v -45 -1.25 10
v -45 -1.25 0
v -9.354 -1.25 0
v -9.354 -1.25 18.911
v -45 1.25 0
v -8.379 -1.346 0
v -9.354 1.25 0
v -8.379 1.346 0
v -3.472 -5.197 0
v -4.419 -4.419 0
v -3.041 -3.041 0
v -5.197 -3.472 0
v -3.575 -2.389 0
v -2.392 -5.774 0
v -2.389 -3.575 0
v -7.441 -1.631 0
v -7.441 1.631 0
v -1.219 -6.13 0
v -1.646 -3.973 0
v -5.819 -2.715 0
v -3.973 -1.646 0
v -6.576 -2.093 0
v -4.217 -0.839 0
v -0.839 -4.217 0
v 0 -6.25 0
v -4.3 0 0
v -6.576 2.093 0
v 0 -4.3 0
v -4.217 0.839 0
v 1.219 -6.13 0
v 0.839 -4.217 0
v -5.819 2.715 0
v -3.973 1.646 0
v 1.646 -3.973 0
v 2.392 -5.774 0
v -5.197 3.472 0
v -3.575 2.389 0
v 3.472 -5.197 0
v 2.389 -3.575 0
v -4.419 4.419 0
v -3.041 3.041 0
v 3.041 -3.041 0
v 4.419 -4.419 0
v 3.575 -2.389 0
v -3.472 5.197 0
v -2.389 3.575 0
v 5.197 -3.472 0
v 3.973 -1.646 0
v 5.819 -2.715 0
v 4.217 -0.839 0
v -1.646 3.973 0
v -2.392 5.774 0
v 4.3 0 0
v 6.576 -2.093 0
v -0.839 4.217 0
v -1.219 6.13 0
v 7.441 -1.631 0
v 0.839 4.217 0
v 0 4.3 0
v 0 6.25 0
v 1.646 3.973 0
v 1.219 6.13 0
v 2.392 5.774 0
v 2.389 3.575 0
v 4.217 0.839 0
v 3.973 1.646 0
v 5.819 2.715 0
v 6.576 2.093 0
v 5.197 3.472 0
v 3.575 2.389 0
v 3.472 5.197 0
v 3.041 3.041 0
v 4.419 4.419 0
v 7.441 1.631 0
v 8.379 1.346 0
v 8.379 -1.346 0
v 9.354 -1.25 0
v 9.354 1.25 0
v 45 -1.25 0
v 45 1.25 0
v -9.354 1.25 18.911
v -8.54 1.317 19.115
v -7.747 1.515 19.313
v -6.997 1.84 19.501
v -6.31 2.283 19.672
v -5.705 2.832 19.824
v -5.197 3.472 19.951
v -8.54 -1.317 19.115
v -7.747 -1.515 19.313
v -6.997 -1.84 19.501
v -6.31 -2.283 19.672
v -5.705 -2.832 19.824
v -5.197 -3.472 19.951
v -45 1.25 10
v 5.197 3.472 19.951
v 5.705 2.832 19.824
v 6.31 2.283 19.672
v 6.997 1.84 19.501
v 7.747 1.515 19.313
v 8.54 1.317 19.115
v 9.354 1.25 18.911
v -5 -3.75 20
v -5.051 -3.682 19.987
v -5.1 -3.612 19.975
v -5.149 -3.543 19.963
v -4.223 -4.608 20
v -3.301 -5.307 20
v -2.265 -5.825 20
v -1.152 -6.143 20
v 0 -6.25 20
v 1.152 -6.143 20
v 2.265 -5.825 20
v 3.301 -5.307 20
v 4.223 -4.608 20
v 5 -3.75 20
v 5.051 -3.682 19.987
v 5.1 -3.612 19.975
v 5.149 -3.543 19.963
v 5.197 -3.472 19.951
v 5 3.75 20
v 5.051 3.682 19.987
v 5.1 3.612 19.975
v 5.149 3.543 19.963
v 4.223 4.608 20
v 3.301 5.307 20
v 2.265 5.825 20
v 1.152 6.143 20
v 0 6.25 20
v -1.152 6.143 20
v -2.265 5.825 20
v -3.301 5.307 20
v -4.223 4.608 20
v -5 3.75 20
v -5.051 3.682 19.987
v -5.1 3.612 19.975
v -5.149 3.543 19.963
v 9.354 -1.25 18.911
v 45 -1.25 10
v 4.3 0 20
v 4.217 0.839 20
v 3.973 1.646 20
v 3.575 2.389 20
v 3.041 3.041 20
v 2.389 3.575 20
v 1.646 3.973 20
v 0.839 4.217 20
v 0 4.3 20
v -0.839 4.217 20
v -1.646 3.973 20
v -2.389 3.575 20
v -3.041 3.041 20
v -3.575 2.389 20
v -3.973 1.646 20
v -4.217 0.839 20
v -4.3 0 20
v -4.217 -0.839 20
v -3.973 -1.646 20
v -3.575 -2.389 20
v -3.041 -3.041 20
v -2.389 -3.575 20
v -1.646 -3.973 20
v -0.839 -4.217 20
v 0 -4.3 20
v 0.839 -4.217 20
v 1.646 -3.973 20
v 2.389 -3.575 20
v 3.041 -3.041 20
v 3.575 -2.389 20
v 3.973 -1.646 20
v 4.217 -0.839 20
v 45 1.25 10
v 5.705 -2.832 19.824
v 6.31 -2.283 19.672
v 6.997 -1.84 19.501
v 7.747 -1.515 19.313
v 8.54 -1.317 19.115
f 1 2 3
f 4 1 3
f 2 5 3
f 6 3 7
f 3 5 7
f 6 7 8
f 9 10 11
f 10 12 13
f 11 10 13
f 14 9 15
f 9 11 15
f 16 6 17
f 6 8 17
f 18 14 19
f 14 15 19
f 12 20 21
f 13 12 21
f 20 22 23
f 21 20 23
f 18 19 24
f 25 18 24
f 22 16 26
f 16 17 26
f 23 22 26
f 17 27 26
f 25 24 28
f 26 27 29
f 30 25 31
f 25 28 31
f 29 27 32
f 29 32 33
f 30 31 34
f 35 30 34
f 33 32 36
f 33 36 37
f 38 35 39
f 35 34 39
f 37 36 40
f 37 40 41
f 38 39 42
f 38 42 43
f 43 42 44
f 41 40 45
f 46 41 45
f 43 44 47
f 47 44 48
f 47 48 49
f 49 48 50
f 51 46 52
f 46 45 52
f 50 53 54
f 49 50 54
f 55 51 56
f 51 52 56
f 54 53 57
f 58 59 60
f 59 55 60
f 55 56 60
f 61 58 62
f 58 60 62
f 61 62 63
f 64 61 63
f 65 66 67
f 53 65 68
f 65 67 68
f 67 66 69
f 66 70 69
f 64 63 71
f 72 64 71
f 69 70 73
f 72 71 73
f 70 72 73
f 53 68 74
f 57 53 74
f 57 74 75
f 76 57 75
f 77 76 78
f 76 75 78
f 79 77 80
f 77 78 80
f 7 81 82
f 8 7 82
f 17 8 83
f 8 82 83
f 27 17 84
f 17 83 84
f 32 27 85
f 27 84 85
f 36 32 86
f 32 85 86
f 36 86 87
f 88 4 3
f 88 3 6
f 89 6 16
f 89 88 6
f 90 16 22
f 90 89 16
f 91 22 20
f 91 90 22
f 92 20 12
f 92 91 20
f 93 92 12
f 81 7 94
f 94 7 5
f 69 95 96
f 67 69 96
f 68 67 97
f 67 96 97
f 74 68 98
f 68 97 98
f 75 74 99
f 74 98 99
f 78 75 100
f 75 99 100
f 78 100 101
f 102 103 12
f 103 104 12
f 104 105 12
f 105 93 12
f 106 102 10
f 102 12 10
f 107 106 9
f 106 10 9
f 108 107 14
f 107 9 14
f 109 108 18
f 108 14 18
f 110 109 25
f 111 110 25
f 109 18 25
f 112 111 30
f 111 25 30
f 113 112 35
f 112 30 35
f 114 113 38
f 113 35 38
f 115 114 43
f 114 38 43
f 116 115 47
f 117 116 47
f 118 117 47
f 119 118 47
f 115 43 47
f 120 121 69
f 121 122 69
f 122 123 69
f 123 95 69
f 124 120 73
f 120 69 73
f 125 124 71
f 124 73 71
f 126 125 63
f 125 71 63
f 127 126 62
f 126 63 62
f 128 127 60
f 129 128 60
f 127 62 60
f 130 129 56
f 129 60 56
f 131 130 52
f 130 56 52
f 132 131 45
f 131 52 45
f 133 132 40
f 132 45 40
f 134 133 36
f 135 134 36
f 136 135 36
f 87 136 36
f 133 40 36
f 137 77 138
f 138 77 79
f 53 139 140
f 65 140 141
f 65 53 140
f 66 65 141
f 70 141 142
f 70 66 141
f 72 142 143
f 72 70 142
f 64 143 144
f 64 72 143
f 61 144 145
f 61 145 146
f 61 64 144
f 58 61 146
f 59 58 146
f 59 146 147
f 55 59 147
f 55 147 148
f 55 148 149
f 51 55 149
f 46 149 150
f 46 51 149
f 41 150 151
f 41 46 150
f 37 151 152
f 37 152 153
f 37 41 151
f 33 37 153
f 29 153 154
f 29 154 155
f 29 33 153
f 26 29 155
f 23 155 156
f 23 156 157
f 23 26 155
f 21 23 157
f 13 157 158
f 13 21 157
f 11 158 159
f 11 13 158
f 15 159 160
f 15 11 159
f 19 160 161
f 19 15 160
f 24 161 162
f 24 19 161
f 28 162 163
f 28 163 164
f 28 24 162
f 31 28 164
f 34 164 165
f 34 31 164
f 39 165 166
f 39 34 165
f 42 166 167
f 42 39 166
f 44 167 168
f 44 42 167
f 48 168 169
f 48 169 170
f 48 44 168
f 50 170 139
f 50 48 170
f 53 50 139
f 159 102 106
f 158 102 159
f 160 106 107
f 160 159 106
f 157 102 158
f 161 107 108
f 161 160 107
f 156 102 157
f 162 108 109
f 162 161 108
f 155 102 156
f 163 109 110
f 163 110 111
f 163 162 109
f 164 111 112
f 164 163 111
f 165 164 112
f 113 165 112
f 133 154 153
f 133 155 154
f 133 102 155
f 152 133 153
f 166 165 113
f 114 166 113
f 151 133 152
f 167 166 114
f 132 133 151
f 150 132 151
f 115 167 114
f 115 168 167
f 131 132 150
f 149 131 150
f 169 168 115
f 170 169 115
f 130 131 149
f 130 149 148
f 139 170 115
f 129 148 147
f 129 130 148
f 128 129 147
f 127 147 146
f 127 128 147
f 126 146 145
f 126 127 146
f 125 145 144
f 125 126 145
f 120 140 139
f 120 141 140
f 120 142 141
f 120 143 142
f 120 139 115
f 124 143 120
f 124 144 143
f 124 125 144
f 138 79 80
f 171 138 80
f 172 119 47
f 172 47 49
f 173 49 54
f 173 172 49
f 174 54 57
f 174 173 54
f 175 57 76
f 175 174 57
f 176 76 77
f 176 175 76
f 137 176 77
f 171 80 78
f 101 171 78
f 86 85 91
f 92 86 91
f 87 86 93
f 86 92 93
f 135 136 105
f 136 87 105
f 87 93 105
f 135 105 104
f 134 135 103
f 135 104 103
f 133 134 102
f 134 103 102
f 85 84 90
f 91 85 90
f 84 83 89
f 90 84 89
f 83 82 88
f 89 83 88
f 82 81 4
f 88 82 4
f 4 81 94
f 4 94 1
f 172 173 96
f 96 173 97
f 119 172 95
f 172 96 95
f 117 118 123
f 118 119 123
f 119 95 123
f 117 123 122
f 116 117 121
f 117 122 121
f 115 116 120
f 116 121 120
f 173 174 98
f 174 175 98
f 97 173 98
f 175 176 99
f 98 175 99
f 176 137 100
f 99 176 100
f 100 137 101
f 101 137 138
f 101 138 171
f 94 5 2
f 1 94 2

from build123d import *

# Parameters (mm, degrees)
F0_R     = 4.3
F1_DEPTH = 20
F2_R     = 5
F3_SIZE2 = 10
F3_SIZE  = 40


with BuildPart() as f1:
    # F0 (on Top) → F1 (new body)
    with BuildSketch(Plane.XY):
        with BuildLine():
            Line((-45, -1.25), (-6.123724357, -1.25))
            ThreePointArc((-6.123724357, -1.25), (0, -6.25), (6.123724357, -1.25))
            Line((6.123724357, -1.25), (45, -1.25))
            Line((45, -1.25), (45, 1.25))
            Line((45, 1.25), (6.123724357, 1.25))
            ThreePointArc((6.123724357, 1.25), (0, 6.25), (-6.123724357, 1.25))
            Line((-6.123724357, 1.25), (-45, 1.25))
            Line((-45, 1.25), (-45, -1.25))
        make_face()
        Circle(F0_R, mode=Mode.SUBTRACT)
    extrude(amount=F1_DEPTH)

    # F2
    f2_edges = [f1.edges().sort_by_distance(p)[0] for p in [
        (-6.123724, -1.25, 10),
        (6.123724, -1.25, 10),
        (-6.123724, 1.25, 10),
        (6.123724, 1.25, 10),
    ]]
    fillet(f2_edges, radius=F2_R)

    # F3
    f3_edges = [f1.edges().sort_by_distance(p)[0] for p in [
        (-45, 0, 20),
        (45, 0, 20),
    ]]
    f3_side = f1.faces().sort_by_distance((-27.177072, 0.341361, 20))[0]
    chamfer(f3_edges, length=F3_SIZE, length2=F3_SIZE2, reference=f3_side)


solid = f1.part
